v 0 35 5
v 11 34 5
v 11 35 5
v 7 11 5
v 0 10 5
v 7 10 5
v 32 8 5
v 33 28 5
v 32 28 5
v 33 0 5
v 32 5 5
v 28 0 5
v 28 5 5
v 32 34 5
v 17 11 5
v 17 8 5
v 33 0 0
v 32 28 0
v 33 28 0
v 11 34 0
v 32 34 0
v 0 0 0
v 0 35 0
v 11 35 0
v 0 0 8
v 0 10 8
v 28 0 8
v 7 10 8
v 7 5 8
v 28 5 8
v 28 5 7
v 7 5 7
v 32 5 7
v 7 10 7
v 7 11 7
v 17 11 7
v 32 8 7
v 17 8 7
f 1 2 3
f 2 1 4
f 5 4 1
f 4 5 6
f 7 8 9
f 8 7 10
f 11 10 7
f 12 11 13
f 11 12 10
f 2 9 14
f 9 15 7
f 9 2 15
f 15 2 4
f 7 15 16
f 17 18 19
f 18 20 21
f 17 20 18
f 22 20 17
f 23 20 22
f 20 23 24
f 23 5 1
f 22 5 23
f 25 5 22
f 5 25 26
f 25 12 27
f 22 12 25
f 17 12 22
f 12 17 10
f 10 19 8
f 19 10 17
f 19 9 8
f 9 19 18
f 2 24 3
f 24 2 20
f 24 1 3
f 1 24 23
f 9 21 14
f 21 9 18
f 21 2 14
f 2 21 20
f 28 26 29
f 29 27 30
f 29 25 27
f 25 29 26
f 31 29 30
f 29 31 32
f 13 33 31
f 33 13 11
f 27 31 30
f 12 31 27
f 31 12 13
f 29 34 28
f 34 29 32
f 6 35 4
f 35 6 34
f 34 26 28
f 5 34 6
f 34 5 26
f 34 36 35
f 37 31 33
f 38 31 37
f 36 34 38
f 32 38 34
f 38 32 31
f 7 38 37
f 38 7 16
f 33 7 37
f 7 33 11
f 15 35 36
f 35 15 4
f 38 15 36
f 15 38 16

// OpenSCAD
translate([5.5, 3.5, 2.5]) color([0.12982285676032723, 0.3955808516982431, 0.9757565794644123]) cube([11, 7, 5], center=true);
translate([16.5, 3.5, 2.5]) color([0.5104745178761232, 0.07645620506689521, 0.7650406152494567]) cube([11, 7, 5], center=true);
translate([27.5, 3.5, 2.5]) color([0.7814438709253152, 0.7748021743948562, 0.5694980380479538]) cube([11, 7, 5], center=true);
translate([5.5, 10.5, 2.5]) color([0.6956987378694627, 0.21345793631163135, 0.7325605908939883]) cube([11, 7, 5], center=true);
translate([16.5, 10.5, 2.5]) color([0.8161739873415944, 0.7599665402219192, 0.353462402585887]) cube([11, 7, 5], center=true);
translate([27.5, 10.5, 2.5]) color([0.5910280505757086, 0.6289893574898388, 0.9008098536570839]) cube([11, 7, 5], center=true);
translate([5.5, 17.5, 2.5]) color([0.1080138952733335, 0.8339337708504084, 0.5264355584690392]) cube([11, 7, 5], center=true);
translate([16.5, 17.5, 2.5]) color([0.3586141205519373, 0.4556029014937524, 0.012635498930738787]) cube([11, 7, 5], center=true);
translate([27.5, 17.5, 2.5]) color([0.22007359233142765, 0.6527634200680049, 0.660849279754449]) cube([11, 7, 5], center=true);
translate([5.5, 24.5, 2.5]) color([0.4946989402863131, 0.9533258805973196, 0.4809150885494712]) cube([11, 7, 5], center=true);
translate([16.5, 24.5, 2.5]) color([0.3139436595456605, 0.8477808391956414, 0.259158299397262]) cube([11, 7, 5], center=true);
translate([27.5, 24.5, 2.5]) color([0.6043059930343495, 0.7034188523223, 0.8216962986917842]) cube([11, 7, 5], center=true);
translate([5.5, 31.5, 2.5]) color([0.7853687501827489, 0.3840923305137113, 0.059180305962736934]) cube([11, 7, 5], center=true);
translate([14.5, 29.5, 2.5]) color([0.03828786548344276, 0.7264603879084595, 0.9616913814068508]) cube([7, 3, 5], center=true);
translate([21.5, 29.5, 2.5]) color([0.3431653742712939, 0.44119509807551416, 0.7257980157417766]) cube([7, 3, 5], center=true);
translate([28.5, 29.5, 2.5]) color([0.6578312458538799, 0.26010658848413604, 0.6715848457987025]) cube([7, 3, 5], center=true);
translate([14.5, 32.5, 2.5]) color([0.3049024195743838, 0.3563579065620385, 0.5395133052630944]) cube([7, 3, 5], center=true);
translate([21.5, 32.5, 2.5]) color([0.7323138239267305, 0.15121621156796483, 0.021987210892938758]) cube([7, 3, 5], center=true);
translate([28.5, 32.5, 2.5]) color([0.6278299544850219, 0.024564677785836264, 0.04496324071616853]) cube([7, 3, 5], center=true);
translate([3.5, 2.5, 6.5]) color([0.22577557672213355, 0.6538768733044555, 0.06654509768602879]) cube([7, 5, 3], center=true);
translate([10.5, 2.5, 6.5]) color([0.06240576762652772, 0.9720932443736168, 0.4226528937805498]) cube([7, 5, 3], center=true);
translate([17.5, 2.5, 6.5]) color([0.8924289339928592, 0.21652428395276402, 0.4352131794546169]) cube([7, 5, 3], center=true);
translate([24.5, 2.5, 6.5]) color([0.35803513461315506, 0.17693553603496914, 0.32881318575191665]) cube([7, 5, 3], center=true);
translate([3.5, 7.5, 6.5]) color([0.9867958186960467, 0.7473090097951195, 0.3826682791831585]) cube([7, 5, 3], center=true);
translate([9.5, 6.5, 6.0]) color([0.40928443439993156, 0.2637409011550663, 0.531336678598825]) cube([5, 3, 2], center=true);
translate([14.5, 6.5, 6.0]) color([0.7356369121419466, 0.686646615750601, 0.46264983534131954]) cube([5, 3, 2], center=true);
translate([19.5, 6.5, 6.0]) color([0.041939046716157, 0.9215078064992686, 0.4089338030960661]) cube([5, 3, 2], center=true);
translate([24.5, 6.5, 6.0]) color([0.3902988670119316, 0.0031101144891549914, 0.13822721408191307]) cube([5, 3, 2], center=true);
translate([29.5, 6.5, 6.0]) color([0.8688534175006787, 0.513934596181303, 0.7324348442226767]) cube([5, 3, 2], center=true);
translate([9.5, 9.5, 6.0]) color([0.14816788643335854, 0.33005100665524945, 0.8401365565378639]) cube([5, 3, 2], center=true);
translate([14.5, 9.5, 6.0]) color([0.8206585211774247, 0.2467942680862406, 0.021975308333072263]) cube([5, 3, 2], center=true);
